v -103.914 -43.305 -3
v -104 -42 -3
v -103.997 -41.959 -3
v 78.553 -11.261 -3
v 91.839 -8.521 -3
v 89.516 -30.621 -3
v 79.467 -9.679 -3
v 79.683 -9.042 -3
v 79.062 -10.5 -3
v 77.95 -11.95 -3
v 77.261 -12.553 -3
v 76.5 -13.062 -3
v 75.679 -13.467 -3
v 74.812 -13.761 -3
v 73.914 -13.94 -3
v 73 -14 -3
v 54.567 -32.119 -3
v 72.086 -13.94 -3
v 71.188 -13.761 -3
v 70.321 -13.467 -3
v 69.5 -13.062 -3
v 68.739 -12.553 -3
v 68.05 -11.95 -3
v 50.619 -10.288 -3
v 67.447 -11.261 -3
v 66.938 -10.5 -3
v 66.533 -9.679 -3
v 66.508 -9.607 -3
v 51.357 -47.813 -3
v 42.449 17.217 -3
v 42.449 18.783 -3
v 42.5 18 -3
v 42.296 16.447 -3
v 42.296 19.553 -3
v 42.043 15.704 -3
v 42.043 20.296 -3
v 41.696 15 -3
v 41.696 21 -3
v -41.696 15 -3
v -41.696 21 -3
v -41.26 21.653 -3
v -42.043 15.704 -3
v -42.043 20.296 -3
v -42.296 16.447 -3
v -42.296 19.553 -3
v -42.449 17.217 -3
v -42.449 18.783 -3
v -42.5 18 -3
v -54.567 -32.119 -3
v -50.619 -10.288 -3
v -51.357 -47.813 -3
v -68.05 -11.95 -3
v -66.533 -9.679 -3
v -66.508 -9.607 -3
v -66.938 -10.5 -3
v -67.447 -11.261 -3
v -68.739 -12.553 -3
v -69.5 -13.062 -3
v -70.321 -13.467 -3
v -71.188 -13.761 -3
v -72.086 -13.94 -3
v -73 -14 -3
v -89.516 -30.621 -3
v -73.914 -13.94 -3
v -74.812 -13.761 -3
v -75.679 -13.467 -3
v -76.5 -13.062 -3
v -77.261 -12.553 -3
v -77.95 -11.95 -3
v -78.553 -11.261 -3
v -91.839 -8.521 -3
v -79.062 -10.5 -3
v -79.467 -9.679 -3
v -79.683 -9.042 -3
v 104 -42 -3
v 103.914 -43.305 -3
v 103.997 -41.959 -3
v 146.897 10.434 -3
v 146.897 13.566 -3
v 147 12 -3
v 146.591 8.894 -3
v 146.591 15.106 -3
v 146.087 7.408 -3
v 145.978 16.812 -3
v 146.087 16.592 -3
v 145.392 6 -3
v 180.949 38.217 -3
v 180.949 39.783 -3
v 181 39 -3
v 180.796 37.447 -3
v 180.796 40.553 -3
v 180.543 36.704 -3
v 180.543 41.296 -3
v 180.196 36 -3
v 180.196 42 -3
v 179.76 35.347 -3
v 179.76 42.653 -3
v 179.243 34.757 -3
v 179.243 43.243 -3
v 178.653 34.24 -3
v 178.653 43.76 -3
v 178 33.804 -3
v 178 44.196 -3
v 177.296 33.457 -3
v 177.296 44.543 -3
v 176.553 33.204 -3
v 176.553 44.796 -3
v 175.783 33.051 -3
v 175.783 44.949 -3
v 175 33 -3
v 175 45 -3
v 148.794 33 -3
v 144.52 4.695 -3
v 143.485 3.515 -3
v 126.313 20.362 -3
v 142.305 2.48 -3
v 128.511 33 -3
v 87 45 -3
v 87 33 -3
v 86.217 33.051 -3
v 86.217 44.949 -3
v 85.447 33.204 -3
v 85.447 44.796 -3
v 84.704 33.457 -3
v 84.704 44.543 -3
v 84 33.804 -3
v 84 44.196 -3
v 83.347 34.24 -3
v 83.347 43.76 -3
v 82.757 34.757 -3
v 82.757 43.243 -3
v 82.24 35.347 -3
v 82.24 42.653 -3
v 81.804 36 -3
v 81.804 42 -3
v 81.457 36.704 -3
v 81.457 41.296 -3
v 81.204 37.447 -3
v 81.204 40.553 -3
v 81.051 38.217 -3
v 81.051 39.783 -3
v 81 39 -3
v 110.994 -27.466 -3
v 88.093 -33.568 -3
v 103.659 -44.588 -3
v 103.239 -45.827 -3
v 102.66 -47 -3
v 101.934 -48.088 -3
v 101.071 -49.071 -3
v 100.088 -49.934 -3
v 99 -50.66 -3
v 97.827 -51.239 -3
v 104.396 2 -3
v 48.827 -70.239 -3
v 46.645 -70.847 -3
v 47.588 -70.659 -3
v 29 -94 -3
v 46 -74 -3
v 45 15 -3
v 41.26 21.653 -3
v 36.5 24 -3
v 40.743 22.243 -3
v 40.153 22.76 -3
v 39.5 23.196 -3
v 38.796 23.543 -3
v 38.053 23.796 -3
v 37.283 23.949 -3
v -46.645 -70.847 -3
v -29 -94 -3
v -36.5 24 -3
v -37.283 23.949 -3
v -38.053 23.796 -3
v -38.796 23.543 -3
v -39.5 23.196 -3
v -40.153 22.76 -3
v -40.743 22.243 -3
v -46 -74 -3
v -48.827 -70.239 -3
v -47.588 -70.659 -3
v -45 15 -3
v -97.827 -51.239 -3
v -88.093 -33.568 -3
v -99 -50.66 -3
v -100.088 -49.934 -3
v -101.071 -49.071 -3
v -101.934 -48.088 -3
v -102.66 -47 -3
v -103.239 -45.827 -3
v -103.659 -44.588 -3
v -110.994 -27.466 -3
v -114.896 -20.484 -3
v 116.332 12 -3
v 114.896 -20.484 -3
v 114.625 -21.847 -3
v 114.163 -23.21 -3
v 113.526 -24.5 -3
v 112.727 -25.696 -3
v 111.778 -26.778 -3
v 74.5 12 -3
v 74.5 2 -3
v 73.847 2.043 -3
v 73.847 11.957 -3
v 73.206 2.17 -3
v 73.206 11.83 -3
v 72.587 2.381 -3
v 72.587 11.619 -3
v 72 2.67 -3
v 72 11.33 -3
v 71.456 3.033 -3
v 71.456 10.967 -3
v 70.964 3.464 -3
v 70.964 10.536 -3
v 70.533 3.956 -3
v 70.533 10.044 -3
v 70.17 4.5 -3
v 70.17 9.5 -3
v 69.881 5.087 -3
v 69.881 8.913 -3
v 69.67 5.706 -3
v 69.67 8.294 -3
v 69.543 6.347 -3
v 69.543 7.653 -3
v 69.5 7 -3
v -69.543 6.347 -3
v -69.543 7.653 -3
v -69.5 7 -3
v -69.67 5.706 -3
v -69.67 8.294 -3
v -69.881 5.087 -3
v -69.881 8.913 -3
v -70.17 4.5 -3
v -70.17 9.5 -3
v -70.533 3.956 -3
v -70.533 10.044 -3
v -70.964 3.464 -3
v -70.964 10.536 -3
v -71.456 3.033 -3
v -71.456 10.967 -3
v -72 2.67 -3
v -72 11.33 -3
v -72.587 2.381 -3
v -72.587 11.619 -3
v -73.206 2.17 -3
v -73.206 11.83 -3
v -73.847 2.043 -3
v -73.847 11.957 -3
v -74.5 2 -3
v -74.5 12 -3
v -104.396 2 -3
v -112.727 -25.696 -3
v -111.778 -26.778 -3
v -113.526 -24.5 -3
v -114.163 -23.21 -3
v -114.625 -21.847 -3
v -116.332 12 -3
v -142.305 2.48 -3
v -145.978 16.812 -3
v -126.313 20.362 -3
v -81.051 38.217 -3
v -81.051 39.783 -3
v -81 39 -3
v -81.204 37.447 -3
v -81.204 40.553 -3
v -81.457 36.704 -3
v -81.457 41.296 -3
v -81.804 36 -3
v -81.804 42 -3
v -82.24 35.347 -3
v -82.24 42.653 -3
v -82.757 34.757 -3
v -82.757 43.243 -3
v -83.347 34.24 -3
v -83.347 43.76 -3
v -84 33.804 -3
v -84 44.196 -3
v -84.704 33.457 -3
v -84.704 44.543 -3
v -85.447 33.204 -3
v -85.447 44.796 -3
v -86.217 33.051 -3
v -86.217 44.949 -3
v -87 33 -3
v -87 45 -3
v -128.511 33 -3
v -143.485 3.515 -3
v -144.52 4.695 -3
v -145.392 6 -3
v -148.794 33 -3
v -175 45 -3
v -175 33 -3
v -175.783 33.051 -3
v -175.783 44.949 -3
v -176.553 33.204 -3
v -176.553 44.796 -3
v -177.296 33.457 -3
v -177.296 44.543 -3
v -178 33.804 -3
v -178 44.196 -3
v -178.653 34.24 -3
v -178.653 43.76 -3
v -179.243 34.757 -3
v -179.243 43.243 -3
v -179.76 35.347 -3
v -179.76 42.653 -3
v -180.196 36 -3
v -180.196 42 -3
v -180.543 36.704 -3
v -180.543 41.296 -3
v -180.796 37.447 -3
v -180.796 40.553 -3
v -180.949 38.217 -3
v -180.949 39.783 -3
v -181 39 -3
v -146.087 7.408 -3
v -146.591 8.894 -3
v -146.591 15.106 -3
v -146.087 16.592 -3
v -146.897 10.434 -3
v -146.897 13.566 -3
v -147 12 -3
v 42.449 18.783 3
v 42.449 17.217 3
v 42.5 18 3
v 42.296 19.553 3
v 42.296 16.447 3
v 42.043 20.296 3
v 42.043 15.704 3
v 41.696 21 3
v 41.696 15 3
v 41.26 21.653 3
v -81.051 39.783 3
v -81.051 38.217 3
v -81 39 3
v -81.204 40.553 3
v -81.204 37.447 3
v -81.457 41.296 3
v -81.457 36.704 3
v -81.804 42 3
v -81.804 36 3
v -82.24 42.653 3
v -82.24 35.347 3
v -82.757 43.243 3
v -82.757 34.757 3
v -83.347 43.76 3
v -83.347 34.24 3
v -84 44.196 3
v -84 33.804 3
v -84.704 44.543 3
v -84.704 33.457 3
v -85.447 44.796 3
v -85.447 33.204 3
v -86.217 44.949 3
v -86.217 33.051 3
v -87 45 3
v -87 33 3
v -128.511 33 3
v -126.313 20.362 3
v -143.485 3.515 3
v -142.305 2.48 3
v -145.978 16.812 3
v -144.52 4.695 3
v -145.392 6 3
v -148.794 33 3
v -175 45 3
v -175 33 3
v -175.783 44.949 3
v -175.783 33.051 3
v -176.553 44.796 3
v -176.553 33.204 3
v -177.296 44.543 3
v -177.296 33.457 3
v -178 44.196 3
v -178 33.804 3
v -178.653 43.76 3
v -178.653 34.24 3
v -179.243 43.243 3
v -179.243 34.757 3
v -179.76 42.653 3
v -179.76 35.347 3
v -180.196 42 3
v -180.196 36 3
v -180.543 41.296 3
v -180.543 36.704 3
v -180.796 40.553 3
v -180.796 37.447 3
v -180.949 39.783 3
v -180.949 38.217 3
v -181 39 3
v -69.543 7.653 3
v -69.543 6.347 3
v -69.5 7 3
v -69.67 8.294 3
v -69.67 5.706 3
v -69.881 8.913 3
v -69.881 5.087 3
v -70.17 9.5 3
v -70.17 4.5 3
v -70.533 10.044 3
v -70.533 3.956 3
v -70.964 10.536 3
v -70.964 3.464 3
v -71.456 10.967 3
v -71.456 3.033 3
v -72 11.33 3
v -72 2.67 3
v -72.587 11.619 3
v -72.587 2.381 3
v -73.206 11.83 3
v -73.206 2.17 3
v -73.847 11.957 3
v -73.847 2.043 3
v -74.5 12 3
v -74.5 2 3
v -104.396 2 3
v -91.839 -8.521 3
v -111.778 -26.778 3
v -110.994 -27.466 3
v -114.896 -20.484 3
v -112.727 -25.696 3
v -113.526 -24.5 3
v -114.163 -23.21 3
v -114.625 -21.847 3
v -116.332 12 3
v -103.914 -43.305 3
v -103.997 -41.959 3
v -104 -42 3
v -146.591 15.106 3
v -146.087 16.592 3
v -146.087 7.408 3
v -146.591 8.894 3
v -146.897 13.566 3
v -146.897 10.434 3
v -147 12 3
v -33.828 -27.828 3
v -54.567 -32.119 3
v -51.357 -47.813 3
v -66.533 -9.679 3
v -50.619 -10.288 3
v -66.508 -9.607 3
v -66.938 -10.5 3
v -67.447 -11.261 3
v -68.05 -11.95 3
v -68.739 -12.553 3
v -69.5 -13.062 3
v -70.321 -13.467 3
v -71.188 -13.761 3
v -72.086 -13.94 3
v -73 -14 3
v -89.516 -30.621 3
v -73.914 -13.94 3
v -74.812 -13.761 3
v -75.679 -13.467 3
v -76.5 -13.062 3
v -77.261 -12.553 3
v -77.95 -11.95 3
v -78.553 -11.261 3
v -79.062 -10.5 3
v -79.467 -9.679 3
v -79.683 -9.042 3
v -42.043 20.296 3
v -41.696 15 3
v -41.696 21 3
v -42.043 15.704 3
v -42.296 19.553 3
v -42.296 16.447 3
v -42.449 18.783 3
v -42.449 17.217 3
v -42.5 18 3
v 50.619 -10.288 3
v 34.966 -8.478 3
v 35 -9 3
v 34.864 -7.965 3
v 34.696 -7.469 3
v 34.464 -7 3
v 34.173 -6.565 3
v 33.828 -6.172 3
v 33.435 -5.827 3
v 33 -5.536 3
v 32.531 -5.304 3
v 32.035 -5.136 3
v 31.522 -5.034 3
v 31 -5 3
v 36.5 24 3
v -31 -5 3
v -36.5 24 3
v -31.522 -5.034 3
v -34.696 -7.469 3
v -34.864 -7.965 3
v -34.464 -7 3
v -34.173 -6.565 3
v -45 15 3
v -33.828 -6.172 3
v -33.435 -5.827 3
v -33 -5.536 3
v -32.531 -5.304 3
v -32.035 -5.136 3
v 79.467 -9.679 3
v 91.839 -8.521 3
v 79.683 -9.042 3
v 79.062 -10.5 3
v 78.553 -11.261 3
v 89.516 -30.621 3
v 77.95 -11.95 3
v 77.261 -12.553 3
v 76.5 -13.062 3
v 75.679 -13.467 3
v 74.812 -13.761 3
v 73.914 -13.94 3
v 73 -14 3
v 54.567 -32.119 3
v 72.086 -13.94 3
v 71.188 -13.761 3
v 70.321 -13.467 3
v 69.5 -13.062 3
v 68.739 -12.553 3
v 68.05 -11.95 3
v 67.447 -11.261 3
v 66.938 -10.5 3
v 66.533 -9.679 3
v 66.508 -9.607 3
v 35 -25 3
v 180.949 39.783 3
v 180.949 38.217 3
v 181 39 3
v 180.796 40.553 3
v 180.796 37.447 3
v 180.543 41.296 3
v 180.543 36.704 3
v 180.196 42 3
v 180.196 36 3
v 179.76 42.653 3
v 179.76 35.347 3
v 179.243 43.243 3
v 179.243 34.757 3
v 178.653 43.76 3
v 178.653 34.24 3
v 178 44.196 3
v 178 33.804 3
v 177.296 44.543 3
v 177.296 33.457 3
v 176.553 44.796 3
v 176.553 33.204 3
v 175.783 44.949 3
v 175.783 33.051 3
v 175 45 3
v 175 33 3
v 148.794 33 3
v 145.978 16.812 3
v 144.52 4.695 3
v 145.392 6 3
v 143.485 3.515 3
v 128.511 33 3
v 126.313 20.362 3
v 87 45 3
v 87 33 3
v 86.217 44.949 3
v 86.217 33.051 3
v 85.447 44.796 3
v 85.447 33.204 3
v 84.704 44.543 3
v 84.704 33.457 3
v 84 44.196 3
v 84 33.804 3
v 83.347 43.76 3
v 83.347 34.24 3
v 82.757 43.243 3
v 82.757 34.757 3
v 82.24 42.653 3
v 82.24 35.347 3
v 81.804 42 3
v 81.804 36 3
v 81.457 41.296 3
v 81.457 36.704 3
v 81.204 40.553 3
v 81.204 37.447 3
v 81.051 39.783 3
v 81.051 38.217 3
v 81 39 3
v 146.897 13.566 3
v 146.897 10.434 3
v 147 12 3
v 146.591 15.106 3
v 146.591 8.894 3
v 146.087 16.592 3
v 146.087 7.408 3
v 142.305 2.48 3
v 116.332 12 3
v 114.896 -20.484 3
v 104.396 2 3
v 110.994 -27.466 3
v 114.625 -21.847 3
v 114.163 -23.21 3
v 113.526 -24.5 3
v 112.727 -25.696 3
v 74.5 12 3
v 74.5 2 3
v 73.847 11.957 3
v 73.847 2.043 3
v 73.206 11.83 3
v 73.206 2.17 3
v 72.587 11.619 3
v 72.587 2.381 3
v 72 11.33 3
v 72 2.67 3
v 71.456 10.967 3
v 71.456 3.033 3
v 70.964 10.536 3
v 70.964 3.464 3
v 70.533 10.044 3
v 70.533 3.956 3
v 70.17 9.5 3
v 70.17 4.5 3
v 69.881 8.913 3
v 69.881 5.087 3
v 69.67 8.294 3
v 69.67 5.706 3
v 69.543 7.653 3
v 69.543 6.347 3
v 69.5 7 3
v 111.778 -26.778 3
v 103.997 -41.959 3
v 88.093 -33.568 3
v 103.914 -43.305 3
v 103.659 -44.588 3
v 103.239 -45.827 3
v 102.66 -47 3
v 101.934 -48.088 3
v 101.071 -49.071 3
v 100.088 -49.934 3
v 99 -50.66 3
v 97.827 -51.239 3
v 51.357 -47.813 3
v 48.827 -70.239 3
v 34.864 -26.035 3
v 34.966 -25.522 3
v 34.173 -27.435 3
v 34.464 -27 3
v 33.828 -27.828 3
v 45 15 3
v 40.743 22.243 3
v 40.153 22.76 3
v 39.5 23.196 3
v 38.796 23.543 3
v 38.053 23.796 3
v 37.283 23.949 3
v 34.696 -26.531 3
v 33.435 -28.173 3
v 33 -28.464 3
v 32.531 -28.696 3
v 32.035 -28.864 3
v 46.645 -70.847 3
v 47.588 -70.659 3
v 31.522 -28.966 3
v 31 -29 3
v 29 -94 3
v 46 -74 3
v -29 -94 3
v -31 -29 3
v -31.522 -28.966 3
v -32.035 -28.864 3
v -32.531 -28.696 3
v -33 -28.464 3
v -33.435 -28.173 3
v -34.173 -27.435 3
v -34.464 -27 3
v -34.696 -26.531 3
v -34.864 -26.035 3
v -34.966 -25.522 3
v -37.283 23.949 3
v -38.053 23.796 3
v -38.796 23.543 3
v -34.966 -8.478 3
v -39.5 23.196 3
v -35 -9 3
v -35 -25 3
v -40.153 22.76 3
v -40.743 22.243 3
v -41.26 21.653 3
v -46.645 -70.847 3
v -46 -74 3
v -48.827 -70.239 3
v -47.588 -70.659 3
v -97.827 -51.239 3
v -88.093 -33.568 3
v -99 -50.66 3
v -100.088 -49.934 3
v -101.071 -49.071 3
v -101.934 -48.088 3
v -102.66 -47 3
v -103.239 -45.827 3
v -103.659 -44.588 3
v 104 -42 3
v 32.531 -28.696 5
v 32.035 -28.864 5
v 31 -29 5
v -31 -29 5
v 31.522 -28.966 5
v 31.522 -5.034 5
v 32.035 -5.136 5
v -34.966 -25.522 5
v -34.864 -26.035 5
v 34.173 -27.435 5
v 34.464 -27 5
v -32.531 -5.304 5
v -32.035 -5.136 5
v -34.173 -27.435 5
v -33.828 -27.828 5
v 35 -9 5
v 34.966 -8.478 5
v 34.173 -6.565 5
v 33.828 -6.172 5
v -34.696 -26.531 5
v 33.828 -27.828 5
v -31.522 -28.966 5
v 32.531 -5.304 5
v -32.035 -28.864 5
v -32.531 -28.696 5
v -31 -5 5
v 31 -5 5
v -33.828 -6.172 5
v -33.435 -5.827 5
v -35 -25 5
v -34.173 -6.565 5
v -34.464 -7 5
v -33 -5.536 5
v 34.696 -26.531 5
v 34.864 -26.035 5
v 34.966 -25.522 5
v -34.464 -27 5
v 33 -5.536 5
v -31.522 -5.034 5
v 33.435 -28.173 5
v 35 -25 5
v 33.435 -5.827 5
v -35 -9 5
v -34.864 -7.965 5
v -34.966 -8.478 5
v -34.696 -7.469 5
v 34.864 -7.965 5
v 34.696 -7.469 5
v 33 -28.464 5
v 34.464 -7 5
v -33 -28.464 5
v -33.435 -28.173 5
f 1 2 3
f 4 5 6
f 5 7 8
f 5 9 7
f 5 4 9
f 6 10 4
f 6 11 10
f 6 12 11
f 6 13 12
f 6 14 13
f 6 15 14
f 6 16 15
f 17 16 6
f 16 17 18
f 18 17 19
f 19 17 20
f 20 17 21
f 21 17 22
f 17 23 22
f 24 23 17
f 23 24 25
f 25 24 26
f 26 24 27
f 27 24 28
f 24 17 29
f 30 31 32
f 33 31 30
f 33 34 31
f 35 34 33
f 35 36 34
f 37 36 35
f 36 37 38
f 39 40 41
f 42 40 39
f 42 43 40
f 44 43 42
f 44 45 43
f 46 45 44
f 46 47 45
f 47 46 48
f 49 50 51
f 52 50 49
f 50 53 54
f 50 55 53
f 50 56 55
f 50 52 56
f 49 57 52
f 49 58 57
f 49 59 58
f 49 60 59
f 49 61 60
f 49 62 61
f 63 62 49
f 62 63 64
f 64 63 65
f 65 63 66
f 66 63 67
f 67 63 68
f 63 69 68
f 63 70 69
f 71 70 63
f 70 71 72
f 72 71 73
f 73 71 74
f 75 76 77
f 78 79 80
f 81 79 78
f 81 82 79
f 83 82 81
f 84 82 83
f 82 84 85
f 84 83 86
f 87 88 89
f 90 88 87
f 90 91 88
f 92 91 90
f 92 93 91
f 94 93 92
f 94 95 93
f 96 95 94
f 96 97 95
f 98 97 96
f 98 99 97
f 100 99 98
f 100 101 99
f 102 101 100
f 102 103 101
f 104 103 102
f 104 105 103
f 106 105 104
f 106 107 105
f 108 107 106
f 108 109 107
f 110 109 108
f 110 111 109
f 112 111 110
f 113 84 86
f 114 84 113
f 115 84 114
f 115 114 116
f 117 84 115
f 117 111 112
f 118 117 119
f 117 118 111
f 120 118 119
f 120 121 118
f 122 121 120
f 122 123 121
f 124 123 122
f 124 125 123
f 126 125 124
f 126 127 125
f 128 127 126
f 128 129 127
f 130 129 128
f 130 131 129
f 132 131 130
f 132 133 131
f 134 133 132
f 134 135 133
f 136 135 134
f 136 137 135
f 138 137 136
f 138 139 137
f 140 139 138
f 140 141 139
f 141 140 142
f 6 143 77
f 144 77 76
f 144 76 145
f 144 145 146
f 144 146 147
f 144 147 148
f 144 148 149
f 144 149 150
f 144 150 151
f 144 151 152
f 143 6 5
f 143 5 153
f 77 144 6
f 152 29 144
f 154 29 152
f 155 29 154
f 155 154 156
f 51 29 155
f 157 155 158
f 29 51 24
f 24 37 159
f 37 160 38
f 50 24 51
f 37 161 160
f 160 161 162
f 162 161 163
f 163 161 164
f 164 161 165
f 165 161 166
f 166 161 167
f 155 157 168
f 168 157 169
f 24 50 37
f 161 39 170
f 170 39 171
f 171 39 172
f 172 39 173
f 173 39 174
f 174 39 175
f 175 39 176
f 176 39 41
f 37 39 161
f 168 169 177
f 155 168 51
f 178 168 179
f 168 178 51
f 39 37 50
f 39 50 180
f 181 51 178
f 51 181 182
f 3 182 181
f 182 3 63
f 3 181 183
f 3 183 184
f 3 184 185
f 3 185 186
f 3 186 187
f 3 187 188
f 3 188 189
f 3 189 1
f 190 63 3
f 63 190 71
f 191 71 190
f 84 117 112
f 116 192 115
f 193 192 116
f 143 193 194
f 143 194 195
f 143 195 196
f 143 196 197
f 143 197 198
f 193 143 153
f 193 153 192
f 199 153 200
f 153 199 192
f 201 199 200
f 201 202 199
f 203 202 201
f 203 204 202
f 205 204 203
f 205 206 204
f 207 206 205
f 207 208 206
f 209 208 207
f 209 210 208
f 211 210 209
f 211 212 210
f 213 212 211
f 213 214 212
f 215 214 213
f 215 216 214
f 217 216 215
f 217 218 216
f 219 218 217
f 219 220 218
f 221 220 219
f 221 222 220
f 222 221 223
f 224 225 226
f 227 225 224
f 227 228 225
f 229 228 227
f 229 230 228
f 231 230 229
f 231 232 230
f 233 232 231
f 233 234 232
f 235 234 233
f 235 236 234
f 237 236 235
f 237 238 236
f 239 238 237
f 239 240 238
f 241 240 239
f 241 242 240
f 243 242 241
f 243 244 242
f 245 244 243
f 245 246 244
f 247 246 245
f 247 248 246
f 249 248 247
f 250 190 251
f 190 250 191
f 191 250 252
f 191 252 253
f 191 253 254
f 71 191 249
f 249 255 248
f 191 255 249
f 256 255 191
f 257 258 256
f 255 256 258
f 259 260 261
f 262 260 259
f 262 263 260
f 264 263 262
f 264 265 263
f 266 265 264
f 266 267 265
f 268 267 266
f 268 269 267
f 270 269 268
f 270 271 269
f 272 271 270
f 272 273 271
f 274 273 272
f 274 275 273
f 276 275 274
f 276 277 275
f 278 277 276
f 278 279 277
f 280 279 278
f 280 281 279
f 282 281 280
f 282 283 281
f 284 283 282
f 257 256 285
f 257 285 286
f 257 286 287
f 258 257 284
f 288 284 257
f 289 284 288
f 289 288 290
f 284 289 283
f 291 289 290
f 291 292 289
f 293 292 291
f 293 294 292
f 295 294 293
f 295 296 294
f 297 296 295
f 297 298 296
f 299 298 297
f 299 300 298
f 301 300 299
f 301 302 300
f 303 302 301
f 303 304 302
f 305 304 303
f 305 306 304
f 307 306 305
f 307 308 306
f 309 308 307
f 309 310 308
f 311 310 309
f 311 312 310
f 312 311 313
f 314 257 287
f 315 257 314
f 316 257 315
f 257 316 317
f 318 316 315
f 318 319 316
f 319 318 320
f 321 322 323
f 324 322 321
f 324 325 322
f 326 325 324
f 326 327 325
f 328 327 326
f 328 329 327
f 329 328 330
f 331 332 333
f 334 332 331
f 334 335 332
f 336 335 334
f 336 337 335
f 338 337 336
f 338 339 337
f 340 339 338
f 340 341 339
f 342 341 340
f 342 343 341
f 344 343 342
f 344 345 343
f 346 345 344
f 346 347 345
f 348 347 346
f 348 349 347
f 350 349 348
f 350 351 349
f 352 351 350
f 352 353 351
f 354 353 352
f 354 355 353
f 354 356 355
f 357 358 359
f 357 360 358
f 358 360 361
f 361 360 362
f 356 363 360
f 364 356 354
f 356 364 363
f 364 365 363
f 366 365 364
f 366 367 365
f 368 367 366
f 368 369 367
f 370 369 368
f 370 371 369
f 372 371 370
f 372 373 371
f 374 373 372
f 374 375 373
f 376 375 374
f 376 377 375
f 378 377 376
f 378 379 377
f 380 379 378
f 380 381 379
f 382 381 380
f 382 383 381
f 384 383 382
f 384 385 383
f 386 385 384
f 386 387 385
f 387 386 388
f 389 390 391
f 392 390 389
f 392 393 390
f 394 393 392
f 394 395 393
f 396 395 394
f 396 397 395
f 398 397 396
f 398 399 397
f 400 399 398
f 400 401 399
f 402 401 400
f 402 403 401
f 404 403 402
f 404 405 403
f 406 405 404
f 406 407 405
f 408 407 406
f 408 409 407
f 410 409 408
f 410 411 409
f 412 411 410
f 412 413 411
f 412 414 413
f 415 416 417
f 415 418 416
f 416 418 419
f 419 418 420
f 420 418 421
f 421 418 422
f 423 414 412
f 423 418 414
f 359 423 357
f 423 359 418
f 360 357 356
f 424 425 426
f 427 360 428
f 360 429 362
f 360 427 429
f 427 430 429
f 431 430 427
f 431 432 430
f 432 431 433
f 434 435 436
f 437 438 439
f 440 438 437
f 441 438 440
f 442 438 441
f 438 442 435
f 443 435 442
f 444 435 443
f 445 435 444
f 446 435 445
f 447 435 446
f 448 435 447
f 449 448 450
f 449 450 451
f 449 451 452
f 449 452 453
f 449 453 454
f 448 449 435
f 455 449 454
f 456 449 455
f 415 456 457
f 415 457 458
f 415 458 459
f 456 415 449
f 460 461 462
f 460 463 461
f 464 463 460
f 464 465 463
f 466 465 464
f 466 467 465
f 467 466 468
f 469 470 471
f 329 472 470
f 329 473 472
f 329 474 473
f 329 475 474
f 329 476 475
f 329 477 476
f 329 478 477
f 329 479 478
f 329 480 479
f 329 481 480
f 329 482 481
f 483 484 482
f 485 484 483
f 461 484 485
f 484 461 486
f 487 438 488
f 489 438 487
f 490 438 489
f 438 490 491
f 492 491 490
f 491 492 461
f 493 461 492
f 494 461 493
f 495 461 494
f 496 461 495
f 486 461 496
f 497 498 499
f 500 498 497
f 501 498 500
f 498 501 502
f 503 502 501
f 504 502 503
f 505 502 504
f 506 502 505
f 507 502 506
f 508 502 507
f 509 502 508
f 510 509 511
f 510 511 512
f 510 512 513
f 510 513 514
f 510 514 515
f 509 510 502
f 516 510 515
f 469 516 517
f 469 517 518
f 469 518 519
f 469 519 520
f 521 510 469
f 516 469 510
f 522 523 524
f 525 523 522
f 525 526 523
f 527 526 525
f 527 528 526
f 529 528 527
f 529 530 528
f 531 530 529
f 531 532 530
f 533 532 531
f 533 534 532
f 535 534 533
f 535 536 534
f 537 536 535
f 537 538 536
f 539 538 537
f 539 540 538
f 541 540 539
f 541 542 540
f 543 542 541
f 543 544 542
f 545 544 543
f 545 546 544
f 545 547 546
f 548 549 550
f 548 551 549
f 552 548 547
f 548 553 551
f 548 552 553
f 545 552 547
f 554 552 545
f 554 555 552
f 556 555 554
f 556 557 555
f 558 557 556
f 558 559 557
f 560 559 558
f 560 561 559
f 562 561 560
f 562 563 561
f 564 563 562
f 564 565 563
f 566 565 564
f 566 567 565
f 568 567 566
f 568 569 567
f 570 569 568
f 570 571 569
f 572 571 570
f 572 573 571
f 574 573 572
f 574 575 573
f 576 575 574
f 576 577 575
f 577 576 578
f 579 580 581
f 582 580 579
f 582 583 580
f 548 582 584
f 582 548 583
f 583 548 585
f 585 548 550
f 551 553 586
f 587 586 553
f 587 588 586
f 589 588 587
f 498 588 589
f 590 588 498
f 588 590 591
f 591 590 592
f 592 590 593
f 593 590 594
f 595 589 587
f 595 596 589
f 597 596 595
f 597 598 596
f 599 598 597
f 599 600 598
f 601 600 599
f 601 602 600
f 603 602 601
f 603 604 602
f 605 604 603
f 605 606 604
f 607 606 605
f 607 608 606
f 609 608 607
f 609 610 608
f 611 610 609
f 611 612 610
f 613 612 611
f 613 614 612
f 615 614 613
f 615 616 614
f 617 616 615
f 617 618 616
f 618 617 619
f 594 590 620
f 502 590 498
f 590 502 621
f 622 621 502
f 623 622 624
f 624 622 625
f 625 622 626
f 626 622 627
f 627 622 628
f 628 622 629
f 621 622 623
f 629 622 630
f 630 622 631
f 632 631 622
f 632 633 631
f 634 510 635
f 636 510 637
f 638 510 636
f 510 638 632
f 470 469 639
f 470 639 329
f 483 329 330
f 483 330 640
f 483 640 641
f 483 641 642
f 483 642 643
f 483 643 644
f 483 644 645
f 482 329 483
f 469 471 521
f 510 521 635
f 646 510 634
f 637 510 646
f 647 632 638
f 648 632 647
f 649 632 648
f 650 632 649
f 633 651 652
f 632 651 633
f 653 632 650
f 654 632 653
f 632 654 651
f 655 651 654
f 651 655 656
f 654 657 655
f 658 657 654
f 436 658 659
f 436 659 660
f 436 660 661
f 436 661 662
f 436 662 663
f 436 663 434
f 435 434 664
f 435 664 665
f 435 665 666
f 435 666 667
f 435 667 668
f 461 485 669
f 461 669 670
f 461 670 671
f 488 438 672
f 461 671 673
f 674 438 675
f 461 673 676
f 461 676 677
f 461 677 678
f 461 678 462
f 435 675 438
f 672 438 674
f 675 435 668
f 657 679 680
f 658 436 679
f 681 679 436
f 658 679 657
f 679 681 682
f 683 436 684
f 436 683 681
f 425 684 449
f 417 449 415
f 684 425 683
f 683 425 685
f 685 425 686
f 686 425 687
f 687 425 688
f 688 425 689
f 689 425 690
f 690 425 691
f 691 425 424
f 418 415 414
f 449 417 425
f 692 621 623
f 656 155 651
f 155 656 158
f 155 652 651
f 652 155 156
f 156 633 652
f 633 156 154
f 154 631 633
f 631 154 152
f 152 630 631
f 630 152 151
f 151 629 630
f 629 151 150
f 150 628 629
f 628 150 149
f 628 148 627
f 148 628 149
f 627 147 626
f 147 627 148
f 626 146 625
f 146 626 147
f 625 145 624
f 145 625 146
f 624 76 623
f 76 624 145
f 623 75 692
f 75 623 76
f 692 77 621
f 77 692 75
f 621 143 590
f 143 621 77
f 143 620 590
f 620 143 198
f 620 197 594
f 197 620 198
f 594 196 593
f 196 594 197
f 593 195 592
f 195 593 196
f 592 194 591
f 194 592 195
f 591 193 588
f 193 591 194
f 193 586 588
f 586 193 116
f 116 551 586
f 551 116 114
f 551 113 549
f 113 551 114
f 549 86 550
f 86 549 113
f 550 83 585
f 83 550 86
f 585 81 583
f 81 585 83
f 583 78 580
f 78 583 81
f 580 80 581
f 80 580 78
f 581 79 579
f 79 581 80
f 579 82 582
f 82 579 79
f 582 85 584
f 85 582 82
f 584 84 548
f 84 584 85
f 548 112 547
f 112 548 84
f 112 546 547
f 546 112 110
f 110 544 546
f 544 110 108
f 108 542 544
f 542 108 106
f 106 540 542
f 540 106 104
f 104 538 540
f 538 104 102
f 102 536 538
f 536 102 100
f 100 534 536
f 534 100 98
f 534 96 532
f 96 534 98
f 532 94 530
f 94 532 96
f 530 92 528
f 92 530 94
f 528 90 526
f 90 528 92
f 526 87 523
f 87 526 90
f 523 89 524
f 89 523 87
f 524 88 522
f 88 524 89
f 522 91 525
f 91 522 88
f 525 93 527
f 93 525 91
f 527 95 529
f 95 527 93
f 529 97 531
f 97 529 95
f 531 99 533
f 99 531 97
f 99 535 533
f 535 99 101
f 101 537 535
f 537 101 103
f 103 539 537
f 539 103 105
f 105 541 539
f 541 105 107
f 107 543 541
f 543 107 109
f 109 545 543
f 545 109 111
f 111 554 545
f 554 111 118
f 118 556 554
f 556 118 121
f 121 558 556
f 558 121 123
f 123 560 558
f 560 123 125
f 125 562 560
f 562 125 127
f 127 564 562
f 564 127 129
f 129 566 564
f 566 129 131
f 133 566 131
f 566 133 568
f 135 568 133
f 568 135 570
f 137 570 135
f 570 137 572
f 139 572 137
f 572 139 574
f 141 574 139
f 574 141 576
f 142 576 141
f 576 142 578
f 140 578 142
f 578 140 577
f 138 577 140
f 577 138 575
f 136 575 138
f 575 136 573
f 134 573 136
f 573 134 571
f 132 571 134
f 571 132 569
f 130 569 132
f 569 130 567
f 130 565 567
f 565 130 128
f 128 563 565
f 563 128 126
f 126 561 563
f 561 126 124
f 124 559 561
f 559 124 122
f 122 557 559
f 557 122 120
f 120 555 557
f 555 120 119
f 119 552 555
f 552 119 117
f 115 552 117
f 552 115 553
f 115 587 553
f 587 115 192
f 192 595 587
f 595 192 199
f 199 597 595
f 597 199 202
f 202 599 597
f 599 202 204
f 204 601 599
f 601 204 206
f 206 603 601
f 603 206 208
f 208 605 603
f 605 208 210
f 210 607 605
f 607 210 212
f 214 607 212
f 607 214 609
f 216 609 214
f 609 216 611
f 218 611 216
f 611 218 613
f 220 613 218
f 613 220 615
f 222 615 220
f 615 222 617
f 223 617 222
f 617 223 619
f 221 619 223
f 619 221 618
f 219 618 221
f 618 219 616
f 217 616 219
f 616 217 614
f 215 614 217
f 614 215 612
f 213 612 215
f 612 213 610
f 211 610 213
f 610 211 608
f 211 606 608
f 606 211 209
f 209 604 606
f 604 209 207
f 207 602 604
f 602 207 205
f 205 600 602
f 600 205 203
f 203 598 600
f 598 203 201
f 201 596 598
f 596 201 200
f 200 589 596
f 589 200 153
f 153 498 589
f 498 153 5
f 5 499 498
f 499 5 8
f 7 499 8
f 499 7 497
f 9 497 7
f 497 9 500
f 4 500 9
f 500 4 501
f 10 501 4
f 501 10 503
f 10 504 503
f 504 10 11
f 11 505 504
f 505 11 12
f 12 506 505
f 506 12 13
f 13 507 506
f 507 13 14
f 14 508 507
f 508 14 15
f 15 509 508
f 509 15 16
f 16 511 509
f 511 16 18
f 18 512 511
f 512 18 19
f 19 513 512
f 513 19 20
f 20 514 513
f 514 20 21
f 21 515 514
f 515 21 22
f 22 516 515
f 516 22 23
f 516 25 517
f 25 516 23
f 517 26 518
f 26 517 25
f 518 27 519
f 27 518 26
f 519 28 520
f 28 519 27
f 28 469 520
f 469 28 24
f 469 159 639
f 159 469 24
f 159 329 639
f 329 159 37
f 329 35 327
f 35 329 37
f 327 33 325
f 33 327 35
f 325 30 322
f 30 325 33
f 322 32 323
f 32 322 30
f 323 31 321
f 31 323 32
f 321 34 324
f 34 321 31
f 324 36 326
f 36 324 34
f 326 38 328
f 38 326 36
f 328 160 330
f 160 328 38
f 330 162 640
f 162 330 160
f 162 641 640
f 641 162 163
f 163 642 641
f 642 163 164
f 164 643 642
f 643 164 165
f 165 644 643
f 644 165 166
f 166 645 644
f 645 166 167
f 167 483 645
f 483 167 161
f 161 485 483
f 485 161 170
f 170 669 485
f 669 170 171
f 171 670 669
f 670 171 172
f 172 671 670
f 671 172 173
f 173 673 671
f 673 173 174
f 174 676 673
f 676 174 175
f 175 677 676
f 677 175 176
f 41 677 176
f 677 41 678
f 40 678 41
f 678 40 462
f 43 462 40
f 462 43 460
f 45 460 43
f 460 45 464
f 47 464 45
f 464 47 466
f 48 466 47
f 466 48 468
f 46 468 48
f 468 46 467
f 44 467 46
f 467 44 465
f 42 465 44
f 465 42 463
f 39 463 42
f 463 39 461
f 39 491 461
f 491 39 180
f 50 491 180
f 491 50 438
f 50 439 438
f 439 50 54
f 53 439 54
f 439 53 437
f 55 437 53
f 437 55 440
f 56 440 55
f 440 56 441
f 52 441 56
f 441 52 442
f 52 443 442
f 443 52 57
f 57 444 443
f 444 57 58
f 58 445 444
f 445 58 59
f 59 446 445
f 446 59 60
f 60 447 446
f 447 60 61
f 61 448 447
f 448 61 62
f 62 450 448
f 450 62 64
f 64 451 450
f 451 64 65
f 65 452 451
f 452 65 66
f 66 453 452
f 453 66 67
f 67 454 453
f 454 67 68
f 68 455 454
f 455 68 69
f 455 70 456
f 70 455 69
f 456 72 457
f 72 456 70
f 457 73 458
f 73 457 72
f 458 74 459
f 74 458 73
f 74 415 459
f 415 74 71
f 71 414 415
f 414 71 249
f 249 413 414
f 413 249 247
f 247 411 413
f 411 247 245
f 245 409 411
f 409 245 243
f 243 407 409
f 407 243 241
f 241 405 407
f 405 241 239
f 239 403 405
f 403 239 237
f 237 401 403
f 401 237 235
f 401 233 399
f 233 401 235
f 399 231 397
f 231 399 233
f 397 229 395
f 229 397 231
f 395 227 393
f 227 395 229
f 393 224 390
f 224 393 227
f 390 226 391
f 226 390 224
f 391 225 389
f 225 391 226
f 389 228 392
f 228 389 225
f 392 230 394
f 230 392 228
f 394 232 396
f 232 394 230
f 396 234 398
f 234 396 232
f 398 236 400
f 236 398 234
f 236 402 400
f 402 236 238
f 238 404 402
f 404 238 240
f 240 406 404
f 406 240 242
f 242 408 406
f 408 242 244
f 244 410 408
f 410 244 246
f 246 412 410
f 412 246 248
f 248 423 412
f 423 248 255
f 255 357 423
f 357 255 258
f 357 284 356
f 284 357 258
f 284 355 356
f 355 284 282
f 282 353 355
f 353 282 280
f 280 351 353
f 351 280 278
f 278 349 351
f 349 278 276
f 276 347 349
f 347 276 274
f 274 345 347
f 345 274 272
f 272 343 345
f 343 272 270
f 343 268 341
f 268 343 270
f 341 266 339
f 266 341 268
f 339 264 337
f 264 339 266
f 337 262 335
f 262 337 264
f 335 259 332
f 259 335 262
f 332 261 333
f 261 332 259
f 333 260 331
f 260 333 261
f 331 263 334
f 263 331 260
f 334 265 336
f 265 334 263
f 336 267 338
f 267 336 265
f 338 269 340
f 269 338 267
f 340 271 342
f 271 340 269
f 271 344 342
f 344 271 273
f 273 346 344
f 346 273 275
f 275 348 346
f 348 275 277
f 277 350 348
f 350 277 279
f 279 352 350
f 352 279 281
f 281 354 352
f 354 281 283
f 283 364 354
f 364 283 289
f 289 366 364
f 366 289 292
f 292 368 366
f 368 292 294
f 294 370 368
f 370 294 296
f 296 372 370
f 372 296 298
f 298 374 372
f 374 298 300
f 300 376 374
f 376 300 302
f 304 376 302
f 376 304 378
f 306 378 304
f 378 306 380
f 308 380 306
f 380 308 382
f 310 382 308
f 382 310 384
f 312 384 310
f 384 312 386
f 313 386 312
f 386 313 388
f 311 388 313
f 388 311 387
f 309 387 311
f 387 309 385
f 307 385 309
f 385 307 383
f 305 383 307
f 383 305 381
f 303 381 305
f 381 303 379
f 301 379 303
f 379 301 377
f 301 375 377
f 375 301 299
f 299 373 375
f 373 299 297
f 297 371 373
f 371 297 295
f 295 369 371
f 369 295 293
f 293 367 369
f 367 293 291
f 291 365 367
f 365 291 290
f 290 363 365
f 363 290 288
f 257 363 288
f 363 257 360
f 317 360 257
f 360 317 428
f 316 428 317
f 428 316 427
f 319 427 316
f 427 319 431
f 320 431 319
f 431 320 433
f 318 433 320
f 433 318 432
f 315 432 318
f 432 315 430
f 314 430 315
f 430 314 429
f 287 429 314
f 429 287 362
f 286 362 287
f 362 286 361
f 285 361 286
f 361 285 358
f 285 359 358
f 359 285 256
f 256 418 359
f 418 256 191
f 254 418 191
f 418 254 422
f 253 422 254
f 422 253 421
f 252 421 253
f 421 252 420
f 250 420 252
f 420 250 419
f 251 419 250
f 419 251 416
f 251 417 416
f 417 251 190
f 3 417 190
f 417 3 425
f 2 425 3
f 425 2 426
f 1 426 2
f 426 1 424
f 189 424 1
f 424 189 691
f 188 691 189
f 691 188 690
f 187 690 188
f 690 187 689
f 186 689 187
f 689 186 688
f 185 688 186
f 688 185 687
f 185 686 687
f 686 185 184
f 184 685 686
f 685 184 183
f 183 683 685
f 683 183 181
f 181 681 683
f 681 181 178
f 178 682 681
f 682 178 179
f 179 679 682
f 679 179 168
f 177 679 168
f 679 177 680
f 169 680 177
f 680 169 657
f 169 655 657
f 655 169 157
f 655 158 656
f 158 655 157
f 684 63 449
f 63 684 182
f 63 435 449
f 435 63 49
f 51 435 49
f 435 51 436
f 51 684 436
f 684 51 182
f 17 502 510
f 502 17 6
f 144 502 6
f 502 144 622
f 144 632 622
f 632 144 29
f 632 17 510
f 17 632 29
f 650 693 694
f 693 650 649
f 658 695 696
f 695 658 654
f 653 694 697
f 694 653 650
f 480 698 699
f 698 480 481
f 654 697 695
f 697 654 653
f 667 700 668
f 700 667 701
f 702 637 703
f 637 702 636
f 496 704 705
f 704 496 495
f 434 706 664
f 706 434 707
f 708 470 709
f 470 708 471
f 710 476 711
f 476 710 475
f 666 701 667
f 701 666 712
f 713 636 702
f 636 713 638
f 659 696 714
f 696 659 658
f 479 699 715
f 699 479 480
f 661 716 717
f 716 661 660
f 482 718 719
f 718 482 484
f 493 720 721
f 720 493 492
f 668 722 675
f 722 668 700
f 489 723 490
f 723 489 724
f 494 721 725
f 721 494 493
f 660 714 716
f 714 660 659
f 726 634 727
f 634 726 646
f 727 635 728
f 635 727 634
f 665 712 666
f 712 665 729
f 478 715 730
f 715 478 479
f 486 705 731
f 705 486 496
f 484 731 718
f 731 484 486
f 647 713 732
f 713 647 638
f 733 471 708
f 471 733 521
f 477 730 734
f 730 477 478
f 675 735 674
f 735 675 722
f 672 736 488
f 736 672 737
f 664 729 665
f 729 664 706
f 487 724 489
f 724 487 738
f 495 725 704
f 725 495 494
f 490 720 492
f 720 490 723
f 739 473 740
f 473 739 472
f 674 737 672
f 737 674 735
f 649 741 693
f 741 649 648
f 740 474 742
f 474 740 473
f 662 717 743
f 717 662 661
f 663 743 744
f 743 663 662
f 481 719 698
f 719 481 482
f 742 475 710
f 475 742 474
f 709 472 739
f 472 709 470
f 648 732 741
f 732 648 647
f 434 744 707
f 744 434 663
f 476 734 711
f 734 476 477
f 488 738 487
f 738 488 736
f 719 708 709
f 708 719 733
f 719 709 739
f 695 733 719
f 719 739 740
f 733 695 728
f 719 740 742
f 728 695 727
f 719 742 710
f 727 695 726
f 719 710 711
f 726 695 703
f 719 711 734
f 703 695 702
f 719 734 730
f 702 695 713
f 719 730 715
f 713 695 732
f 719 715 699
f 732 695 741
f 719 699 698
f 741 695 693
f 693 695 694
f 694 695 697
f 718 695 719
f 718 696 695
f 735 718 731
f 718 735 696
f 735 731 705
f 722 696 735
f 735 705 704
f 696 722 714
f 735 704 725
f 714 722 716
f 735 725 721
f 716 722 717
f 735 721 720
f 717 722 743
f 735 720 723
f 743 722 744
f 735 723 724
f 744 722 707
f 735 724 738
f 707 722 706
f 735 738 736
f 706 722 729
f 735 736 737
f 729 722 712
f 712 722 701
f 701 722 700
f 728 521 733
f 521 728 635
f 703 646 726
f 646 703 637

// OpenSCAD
/*
  Aerial drone silhouette — cosmetic non-operational scale model.
  Original parametric design inspired by the general appearance of
  a quadcopter; not a reproduction of a commercial product.
  IMPORTANT: Not a flight item, tow target, firearm target, load-bearing
  rig, or safety-rated article. No tow hardware is provided.

  Export parts:
    openscad -o mesh/body.stl -D 'part="body"' model/drone_silhouette.scad
    openscad -o mesh/accent.stl -D 'part="accent"' model/drone_silhouette.scad
*/

$fn = 48;
part = "assembly";          // "assembly", "body", "accent"
scale_factor = 1;          // overall cosmetic size multiplier
body_thickness = 6;       // mm
accent_thickness = 2;     // mm

module link2d(a,b,r) {
    hull() {
        translate(a) circle(r = r);
        translate(b) circle(r = r);
    }
}

module pill2d(x,y,w,h) {
    translate([x,y]) hull() {
        translate([-(w-h)/2,0]) circle(d=h);
        translate([(w-h)/2,0]) circle(d=h);
    }
}

module outline2d() {
    union() {
        // Main block, upper body, and tapering lower camera-like nose.
        polygon(points=[[-45,15],[45,15],[55,-30],[46,-74],
                        [29,-94],[-29,-94],[-46,-74],[-55,-30]]);
        // Broad side arms and curved structural-looking branches.
        for (s=[-1,1]) {
            link2d([s*34,-22],[s*104,-19],11);
            link2d([s*98,-19],[s*135,12],12);
            link2d([s*135,12],[s*139,35],10);
            link2d([s*45,-61],[s*94,-42],10);
            link2d([s*94,-42],[s*108,-13],9);
            // Distinctive stretched propeller silhouettes.
            pill2d(s*131,39,100,12);
            pill2d(s*107,7,75,10);
        }
        // Center ridge for quadcopter visual reference.
        pill2d(0,18,85,12);
    }
}

module body() {
    linear_extrude(height=body_thickness, center=true, convexity=10)
        difference() {
            outline2d();
            // decorative nonfunctional side recesses, not fixtures
            for(s=[-1,1]) {
                translate([s*73,-7]) circle(d=14);
            }
        }
}

module rounded_rect2d(w,h,r) {
    offset(r=r) offset(delta=-r) square([w,h],center=true);
}

module accent() {
    translate([0,-17,(body_thickness+accent_thickness)/2])
        linear_extrude(height=accent_thickness,center=true)
            rounded_rect2d(70,24,4);
}

scale([scale_factor,scale_factor,scale_factor]) {
    if (part=="body" || part=="assembly") color([0.10,0.11,0.12]) body();
    if (part=="accent" || part=="assembly") color([0.96,0.31,0.09]) accent();
}
